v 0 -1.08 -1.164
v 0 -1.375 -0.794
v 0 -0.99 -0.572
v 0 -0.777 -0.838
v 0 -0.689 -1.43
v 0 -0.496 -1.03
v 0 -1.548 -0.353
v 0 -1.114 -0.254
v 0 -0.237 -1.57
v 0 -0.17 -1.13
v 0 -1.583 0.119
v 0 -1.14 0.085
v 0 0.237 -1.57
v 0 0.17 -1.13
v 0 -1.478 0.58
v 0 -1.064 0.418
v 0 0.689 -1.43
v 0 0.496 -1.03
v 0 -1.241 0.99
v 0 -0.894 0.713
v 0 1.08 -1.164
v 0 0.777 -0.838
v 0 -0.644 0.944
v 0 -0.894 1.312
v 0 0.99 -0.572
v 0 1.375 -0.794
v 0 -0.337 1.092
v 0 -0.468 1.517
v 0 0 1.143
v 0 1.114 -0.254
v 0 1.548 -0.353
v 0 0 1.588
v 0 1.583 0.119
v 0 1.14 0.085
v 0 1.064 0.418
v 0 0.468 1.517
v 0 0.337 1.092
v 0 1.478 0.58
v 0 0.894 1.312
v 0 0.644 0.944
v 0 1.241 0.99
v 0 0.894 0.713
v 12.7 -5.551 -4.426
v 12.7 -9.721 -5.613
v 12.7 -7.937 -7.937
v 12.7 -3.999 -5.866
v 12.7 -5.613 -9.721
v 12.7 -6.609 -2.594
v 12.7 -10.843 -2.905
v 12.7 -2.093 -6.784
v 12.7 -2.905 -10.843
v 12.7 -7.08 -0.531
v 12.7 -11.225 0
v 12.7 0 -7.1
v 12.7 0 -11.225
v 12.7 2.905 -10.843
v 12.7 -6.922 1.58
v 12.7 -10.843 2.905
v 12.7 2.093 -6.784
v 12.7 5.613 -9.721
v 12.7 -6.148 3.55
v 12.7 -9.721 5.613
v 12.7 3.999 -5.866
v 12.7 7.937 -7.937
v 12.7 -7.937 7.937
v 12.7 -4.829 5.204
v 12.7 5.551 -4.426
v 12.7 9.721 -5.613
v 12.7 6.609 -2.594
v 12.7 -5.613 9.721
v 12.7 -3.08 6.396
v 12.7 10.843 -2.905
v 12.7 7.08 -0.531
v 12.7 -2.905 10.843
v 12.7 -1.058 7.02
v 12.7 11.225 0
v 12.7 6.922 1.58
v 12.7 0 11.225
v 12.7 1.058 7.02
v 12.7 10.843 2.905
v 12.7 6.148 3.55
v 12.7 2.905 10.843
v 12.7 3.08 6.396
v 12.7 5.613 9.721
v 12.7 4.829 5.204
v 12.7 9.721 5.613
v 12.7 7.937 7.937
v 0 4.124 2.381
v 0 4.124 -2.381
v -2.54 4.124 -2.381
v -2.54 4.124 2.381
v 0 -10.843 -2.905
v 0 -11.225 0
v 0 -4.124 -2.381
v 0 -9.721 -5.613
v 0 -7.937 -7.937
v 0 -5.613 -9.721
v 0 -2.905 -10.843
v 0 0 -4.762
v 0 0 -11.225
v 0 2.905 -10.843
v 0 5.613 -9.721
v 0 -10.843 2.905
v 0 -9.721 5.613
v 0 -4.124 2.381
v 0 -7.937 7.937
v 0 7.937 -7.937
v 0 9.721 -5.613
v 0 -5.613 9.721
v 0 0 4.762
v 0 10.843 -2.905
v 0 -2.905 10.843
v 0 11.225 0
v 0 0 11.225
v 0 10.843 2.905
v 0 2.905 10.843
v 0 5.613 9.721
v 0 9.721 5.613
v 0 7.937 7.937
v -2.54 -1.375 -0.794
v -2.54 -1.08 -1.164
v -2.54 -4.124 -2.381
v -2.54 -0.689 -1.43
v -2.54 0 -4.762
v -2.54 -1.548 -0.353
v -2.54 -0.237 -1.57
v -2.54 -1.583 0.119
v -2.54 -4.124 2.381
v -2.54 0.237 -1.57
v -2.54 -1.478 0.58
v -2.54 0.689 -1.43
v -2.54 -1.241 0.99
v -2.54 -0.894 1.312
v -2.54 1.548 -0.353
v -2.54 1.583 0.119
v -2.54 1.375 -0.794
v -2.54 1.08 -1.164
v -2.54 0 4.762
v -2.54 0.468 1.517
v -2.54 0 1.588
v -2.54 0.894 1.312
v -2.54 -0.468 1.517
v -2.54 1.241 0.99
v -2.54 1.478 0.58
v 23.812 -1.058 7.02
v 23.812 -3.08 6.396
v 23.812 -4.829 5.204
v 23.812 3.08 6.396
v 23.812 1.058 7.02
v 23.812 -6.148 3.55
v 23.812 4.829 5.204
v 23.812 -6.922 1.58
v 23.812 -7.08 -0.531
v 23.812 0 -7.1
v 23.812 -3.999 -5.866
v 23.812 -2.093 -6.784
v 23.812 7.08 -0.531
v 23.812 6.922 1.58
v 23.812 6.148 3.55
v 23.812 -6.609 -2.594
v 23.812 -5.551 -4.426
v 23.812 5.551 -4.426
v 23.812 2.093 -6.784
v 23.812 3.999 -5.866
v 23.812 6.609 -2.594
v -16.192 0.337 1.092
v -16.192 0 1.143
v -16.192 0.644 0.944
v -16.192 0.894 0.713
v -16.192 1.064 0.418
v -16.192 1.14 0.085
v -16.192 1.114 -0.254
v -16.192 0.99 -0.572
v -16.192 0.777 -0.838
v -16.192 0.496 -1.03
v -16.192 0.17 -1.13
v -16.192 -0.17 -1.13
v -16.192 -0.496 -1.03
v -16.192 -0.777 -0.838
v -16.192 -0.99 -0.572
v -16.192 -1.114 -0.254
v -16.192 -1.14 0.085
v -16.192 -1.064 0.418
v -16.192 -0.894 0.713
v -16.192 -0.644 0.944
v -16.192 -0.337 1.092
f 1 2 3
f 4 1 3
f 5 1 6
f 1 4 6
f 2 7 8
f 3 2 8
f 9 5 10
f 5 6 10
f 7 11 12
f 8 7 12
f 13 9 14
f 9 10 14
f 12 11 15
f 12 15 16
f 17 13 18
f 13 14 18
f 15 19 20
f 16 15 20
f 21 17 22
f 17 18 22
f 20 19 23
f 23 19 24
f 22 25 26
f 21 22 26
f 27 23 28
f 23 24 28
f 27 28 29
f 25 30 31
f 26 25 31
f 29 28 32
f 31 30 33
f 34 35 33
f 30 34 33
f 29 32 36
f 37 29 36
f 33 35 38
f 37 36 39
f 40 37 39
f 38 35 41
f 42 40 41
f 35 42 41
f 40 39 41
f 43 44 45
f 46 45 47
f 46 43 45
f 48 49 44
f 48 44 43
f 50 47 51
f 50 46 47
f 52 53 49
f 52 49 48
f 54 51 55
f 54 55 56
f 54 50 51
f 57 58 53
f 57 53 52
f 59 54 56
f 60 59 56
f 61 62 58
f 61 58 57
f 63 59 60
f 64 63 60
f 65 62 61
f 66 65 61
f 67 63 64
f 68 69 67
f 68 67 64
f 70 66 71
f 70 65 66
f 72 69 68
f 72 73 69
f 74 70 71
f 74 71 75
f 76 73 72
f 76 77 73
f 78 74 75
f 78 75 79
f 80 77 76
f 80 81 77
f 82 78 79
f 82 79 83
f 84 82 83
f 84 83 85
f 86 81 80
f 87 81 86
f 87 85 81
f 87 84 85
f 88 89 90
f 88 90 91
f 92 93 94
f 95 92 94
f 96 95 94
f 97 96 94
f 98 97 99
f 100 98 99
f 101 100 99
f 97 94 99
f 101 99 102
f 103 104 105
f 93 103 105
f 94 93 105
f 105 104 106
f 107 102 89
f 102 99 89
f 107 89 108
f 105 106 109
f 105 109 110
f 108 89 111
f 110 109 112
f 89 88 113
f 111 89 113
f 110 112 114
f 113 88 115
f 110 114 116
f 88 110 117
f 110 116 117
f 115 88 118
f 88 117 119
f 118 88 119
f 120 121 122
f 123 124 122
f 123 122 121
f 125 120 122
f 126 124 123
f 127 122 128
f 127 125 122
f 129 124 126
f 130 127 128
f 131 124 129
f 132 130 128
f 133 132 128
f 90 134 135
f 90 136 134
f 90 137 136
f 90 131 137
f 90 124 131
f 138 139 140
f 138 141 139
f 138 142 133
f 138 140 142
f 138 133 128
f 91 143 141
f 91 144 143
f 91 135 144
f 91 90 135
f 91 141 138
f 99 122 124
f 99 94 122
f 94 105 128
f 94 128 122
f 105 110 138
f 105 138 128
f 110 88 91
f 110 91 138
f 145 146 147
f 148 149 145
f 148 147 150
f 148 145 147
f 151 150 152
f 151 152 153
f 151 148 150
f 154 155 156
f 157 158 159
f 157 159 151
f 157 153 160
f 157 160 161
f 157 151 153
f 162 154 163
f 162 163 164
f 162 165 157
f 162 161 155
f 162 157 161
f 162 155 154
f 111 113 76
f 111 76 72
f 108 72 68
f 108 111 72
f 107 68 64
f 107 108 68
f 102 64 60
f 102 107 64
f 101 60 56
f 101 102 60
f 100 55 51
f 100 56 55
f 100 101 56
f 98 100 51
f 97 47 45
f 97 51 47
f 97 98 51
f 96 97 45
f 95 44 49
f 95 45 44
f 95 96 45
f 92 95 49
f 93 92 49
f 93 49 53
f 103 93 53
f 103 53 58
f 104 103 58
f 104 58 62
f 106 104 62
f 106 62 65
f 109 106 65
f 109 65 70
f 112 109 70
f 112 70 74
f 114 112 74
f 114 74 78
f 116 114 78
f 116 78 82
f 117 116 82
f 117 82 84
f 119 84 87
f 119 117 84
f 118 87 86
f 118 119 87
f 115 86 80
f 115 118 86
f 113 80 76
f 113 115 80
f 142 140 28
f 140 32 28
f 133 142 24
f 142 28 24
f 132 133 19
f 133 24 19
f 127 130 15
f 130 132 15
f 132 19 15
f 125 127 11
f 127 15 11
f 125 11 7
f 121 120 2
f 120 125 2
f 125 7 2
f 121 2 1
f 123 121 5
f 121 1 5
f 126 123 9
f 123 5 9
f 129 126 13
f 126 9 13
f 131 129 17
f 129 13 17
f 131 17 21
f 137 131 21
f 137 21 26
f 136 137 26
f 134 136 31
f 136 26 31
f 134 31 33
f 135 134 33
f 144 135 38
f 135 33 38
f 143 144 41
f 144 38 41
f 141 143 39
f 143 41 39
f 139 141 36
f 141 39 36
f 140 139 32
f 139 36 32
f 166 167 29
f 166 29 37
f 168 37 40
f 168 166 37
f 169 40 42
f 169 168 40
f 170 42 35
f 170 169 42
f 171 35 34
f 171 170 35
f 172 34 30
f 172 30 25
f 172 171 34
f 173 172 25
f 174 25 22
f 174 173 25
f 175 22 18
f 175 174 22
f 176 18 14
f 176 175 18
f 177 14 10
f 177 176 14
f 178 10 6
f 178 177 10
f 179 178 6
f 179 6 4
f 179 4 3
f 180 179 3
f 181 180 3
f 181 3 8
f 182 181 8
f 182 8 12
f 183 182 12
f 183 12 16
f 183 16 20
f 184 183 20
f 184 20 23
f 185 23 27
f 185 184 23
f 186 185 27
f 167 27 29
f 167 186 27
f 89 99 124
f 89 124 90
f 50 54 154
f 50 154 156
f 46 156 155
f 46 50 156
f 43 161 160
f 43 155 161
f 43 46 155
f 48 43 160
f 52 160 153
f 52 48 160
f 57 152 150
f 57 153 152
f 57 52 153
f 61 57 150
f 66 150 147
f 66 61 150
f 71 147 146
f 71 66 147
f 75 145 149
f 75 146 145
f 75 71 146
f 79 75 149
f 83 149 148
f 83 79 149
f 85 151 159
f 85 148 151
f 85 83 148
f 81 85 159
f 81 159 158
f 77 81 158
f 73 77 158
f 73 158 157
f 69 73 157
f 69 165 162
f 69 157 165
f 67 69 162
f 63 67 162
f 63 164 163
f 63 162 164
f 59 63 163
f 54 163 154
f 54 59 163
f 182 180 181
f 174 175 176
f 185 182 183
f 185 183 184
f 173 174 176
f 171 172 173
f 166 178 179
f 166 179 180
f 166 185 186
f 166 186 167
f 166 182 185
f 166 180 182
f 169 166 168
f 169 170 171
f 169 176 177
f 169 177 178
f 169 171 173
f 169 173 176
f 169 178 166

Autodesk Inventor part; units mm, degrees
ref_plane "YZ Plane" through (0, 0, 0) normal (1, 0, 0) x (0, 1, 0)
ref_plane "XZ Plane" through (0, 0, 0) normal (0, 1, 0) x (-1, 0, 0)
ref_plane "XY Plane" through (0, 0, 0) normal (0, 0, 1) x (1, 0, 0)
sketch "Sketch1" plane through (0, 0, 0) normal (1, 0, 0) x (0, 1, 0)
  circle A0 centre (0, 0) radius 11.2253
extrude "Extrusion1" add sketch "Sketch1" along normal blind 12.7
sketch "Sketch2" plane through (0, 0, 0) normal (-1, 0, 0) x (0, 0, 1)
  line L0 (-4.7625, 0) -> (-2.3813, 4.1244)
  line L1 (-2.3813, 4.1244) -> (2.3812, 4.1244)
  line L2 (2.3812, 4.1244) -> (4.7625, 0)
  line L3 (4.7625, 0) -> (2.3813, -4.1244)
  line L4 (2.3813, -4.1244) -> (-2.3812, -4.1244)
  line L5 (-2.3812, -4.1244) -> (-4.7625, 0)
  circle A0 centre (0, 0) radius 1.5875
  point P0 (1.6165, 3.316)
extrude "Extrusion2" add sketch "Sketch2" along normal blind 2.54
sketch "Sketch3" plane through (-2.54, 0, 0) normal (-1, 0, 0) x (0, 0, 1)
  circle A0 centre (0, 0) radius 1.143
  dimension "d4" = 2.286
extrude "Extrusion3" add sketch "Sketch3" along normal blind 13.6525 and the other way blind 8.4201
sketch "Sketch4" plane through (12.7, 0, 0) normal (1, 0, 0) x (0, 0, -1)
  circle A0 centre (0, 0) radius 7.0995
extrude "Extrusion4" add sketch "Sketch4" along normal blind 11.1125
properties part number "DC MOTOR NEW"
